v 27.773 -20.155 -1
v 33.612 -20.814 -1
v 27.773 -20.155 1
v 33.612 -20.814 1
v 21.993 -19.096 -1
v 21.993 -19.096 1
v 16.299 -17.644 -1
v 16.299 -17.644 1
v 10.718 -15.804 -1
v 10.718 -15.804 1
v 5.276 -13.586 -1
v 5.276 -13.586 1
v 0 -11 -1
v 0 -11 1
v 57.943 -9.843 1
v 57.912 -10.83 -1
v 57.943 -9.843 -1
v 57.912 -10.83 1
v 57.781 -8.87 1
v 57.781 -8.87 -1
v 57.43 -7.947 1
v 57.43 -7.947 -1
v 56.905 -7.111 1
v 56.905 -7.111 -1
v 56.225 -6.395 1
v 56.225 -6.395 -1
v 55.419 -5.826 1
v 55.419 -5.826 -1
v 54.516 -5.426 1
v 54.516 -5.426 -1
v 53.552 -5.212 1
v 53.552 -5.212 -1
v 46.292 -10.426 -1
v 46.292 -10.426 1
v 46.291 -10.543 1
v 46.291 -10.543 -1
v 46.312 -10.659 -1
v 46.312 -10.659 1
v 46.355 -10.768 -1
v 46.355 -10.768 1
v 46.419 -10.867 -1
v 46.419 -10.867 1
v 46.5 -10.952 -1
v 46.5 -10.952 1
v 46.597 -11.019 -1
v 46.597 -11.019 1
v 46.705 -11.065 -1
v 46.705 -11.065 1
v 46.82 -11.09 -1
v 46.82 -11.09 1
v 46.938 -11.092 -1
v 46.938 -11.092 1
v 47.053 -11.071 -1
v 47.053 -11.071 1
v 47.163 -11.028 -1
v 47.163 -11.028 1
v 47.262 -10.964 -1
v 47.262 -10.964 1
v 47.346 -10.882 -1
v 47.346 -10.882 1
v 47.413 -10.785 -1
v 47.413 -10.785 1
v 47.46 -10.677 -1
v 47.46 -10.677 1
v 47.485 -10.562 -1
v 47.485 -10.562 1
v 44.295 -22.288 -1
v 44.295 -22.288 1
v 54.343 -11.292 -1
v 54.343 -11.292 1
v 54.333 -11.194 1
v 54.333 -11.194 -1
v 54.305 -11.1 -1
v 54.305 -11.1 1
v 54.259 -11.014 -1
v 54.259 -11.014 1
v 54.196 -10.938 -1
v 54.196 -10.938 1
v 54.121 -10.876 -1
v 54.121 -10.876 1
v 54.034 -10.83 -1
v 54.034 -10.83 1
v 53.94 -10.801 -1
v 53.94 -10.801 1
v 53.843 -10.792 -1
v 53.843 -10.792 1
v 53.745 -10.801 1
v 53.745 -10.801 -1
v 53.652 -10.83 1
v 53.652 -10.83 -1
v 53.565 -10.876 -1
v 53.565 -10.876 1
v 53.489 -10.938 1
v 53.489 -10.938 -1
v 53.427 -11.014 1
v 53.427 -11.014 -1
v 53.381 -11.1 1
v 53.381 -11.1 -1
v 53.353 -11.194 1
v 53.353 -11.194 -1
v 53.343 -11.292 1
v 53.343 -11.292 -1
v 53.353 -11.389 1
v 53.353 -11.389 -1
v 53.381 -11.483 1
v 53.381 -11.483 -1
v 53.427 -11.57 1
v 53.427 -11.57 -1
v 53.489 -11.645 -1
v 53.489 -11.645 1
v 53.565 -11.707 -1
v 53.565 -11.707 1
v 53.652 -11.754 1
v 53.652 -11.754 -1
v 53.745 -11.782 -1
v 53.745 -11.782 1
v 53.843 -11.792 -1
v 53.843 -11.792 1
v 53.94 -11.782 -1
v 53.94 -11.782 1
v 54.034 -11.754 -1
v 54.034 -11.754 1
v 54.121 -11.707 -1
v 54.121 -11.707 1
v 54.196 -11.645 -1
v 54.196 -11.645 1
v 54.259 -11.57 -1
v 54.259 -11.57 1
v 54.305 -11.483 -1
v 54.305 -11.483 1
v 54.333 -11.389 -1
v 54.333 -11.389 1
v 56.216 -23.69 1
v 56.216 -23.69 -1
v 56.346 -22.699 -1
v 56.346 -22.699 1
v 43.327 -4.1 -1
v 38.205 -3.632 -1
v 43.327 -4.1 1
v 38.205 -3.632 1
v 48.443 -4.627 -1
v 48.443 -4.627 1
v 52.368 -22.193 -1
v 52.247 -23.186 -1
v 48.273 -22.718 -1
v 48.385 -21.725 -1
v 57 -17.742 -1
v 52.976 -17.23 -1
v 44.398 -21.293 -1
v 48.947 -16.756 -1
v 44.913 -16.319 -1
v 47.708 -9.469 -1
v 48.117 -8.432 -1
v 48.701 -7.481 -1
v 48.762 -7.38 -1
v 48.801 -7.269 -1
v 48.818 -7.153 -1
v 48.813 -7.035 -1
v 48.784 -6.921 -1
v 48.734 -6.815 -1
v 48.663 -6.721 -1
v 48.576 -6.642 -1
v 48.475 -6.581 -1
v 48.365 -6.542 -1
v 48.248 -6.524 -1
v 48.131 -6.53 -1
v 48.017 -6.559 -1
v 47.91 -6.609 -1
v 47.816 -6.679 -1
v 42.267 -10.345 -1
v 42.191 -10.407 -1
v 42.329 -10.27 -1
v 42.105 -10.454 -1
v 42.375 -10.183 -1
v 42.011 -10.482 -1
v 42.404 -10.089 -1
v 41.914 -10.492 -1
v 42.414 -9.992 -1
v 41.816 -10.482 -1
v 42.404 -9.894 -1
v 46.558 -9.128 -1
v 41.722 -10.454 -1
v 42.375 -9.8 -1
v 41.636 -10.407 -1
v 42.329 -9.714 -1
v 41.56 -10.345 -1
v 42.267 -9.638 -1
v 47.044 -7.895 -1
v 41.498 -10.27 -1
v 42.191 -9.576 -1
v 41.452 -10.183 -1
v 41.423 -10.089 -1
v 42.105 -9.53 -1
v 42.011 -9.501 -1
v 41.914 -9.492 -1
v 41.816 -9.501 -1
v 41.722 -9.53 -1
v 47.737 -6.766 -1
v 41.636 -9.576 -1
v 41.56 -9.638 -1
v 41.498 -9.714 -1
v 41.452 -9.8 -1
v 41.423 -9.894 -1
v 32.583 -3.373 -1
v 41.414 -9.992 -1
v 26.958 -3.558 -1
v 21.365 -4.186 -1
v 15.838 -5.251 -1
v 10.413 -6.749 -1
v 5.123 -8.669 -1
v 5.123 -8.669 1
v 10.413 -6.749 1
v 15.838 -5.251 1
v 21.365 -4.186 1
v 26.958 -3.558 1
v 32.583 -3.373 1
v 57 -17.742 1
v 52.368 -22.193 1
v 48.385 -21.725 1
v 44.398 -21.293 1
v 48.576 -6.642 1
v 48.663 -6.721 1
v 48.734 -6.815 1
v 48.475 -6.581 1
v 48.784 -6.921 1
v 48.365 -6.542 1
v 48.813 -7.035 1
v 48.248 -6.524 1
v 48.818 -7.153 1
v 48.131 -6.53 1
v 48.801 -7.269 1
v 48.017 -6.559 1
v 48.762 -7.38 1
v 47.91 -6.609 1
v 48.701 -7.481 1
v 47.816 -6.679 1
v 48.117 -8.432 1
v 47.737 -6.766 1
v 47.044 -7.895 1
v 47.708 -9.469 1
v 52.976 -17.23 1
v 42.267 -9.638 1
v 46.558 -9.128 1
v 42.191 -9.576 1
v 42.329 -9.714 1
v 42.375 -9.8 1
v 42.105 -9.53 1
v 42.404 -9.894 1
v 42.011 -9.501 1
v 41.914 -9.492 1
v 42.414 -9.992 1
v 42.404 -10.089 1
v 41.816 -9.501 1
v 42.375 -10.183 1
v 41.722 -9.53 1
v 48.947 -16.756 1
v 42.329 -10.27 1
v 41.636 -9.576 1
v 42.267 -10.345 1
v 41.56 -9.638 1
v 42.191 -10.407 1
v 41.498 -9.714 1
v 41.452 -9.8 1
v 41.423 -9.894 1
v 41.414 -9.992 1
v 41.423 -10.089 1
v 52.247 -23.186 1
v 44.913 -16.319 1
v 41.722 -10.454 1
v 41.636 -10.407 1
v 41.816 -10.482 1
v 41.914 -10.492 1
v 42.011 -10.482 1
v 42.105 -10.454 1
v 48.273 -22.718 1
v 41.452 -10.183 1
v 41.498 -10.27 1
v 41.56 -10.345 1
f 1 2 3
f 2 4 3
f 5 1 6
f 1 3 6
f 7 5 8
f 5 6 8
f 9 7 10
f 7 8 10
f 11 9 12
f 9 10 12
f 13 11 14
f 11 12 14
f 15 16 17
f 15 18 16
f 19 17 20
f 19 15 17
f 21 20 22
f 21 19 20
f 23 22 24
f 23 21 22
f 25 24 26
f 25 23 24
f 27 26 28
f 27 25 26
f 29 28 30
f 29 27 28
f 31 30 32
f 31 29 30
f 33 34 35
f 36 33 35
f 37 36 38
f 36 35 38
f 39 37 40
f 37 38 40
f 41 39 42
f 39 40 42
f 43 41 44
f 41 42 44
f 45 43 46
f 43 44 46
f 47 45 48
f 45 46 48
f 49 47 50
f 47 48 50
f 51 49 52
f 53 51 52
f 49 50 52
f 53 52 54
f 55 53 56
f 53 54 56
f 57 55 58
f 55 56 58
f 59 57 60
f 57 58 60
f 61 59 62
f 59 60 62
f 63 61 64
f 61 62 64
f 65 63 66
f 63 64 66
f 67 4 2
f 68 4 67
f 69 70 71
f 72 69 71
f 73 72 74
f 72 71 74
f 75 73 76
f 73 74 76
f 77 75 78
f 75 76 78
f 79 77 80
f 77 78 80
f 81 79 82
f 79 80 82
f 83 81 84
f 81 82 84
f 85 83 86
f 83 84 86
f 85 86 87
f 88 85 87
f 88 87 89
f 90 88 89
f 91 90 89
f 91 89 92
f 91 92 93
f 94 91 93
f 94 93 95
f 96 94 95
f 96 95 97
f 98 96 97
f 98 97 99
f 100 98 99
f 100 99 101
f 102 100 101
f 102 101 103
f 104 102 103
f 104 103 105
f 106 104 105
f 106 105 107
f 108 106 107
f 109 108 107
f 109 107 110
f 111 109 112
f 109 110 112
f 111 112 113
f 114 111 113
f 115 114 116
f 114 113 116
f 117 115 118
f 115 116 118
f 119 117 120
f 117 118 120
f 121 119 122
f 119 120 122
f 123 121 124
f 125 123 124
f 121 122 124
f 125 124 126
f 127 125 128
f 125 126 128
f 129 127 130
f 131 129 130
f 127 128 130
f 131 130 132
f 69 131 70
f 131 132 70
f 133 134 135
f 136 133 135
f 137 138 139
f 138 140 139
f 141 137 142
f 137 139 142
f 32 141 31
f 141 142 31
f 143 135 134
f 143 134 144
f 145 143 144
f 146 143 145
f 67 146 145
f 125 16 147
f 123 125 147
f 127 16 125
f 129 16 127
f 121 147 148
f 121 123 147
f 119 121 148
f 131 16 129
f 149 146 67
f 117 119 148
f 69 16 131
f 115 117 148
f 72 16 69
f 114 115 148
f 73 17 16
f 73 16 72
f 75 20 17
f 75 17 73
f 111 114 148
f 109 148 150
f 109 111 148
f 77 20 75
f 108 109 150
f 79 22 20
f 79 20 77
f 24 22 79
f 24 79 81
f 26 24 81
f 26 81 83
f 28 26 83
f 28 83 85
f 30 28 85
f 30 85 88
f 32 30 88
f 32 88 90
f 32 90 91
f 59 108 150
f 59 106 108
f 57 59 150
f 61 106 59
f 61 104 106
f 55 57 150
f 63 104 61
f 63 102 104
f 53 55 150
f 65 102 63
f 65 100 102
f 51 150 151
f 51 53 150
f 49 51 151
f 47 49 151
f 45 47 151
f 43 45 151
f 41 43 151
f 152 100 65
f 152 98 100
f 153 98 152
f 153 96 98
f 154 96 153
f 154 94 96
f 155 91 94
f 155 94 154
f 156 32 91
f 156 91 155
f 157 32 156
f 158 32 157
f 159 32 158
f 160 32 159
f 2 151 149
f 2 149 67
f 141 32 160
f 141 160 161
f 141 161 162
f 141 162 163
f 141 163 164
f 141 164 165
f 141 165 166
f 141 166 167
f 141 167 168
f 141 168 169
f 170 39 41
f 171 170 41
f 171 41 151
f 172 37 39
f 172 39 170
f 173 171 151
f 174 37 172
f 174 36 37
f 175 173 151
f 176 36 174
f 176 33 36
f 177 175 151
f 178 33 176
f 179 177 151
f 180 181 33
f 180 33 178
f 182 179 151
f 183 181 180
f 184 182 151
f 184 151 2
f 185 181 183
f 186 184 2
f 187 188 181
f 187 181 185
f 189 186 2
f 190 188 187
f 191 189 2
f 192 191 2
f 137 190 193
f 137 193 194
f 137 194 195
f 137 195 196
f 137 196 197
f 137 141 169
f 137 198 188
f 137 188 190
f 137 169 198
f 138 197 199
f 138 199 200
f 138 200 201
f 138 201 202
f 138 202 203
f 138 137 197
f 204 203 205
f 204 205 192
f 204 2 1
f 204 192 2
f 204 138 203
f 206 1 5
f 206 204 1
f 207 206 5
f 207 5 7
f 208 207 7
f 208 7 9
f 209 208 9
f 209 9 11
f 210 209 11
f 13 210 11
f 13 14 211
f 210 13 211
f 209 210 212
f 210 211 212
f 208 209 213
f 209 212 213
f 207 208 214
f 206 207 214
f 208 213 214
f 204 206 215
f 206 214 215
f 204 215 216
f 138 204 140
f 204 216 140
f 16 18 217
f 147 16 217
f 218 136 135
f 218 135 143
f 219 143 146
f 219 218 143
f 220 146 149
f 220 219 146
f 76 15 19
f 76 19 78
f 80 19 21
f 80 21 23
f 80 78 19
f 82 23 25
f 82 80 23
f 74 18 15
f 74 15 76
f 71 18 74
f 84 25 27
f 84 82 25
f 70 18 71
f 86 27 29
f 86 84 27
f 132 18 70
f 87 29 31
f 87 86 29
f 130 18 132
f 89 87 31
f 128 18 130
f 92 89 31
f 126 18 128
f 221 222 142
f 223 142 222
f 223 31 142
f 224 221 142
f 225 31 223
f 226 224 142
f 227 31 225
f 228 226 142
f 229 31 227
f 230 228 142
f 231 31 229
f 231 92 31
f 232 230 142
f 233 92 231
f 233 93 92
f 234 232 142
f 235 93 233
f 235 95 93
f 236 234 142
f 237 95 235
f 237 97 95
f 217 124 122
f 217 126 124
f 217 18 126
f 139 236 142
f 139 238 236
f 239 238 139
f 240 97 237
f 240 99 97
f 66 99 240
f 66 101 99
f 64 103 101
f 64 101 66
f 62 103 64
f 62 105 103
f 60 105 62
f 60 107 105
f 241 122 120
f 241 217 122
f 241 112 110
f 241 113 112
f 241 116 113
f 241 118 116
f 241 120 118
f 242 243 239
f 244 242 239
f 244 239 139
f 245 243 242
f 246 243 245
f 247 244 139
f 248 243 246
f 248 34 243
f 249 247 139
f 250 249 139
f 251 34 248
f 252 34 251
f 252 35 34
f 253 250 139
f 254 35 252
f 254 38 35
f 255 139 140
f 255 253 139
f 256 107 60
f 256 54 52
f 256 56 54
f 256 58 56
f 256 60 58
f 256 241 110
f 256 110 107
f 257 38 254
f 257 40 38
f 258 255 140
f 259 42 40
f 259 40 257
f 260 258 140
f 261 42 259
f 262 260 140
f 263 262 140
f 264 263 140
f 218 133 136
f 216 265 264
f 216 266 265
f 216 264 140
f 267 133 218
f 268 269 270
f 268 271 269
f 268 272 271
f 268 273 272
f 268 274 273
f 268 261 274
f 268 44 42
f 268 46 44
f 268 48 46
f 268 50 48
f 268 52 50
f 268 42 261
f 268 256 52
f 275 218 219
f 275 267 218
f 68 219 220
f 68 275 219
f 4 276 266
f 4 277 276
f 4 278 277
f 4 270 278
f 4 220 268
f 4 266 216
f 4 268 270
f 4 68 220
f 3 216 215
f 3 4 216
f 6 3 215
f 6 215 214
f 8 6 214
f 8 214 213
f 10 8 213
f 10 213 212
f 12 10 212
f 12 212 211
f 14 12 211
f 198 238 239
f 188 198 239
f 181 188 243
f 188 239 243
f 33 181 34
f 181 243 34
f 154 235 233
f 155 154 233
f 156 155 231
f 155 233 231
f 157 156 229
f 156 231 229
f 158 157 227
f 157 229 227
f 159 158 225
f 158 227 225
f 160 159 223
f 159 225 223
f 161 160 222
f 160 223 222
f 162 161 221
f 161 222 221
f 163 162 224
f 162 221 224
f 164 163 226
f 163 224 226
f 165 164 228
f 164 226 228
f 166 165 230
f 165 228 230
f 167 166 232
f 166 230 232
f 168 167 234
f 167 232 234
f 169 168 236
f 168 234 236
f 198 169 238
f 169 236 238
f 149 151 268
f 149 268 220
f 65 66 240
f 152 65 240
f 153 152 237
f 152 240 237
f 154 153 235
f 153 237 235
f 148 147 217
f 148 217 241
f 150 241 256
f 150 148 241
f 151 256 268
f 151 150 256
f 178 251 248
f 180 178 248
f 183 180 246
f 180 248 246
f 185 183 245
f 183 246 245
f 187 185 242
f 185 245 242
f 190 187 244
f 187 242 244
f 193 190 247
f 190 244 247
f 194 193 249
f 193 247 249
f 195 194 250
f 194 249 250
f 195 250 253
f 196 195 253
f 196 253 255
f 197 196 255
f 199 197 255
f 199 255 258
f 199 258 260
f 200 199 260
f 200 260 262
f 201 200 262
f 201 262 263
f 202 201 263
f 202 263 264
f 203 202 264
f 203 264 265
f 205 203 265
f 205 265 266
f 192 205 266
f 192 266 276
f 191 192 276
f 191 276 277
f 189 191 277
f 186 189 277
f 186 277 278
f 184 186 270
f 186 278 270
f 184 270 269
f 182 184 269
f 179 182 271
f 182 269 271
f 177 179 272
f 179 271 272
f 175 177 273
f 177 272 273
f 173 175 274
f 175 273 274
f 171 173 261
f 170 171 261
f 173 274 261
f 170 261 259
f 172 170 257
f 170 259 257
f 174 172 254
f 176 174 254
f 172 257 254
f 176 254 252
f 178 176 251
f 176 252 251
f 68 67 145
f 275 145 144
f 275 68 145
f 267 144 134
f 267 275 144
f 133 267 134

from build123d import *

# Parameters (mm, degrees)
P_IDAT_VYSUNUT_M1_DEPTH             = 1
SKICA3_R                            = 0.5
ODEBRAT_VYSUNUT_M1_DEPTH            = 64.02628038
ODEBRAT_VYSUNUT_M2_DEPTH            = 64.02628038
ODEBRAT_VYSUNUT_M2_DEPTH_BACK       = 64.02628038
P_IDAT_VYSUNUT_M2_REACH             = 64.499
P_IDAT_VYSUNUT_M2_DIRECTION_2_REACH = 64.499
ZAOBLIT1_R                          = 5


with BuildPart() as part:
    # Skica2 → Přidat vysunutím1 (new, symmetric)
    with BuildSketch(Plane.XY):
        with BuildLine():
            Line((58.568883798, -5.84497543), (56.281036775, -23.194781077))
            ThreePointArc((56.281036775, -23.194781077), (44.962038089, -21.854387935), (33.611521044, -20.814124588))
            ThreePointArc((33.611521044, -20.814124588), (16.298701423, -17.643643834), (0, -11))
            ThreePointArc((0, -11), (18.591127375, -4.663998517), (38.205152177, -3.63202809))
            ThreePointArc((38.205152177, -3.63202809), (48.399667289, -4.622101799), (58.568883798, -5.84497543))
        make_face()
    extrude(amount=P_IDAT_VYSUNUT_M1_DEPTH, both=True)

    # Skica3 → Odebrat vysunutím1 (cut, through all)
    with BuildSketch(Plane.XY.offset(1)):
        with Locations((41.913528916, -9.991754516)):
            Circle(SKICA3_R)
        with Locations((53.842906505, -11.291735411)):
            Circle(SKICA3_R)
        with BuildLine():
            ThreePointArc((47.737008304, -6.766472197), (46.773837436, -8.500989544), (46.292411943, -10.42569161))
            ThreePointArc((46.292411943, -10.42569161), (46.82013174, -11.090155165), (47.484595295, -10.562435368))
            ThreePointArc((47.484595295, -10.562435368), (47.890006236, -8.941633628), (48.701097493, -7.480987442))
            ThreePointArc((48.701097493, -7.480987442), (48.576310521, -6.641685225), (47.737008304, -6.766472197))
        make_face()
    extrude(amount=-ODEBRAT_VYSUNUT_M1_DEPTH, mode=Mode.SUBTRACT)

    # Skica4 → Odebrat vysunutím2 (cut, two sides: drawn at the far end of the back side and taken through both)
    with BuildSketch(Plane.XY.offset(1).offset(-ODEBRAT_VYSUNUT_M2_DEPTH_BACK)):
        with BuildLine():
            Line((44.91326279, -16.319473776), (44.346696401, -21.790214359))
            ThreePointArc((44.346696401, -21.790214359), (50.318767602, -22.450854723), (56.281036775, -23.194781077))
            Line((56.281036775, -23.194781077), (57.000074411, -17.741985017))
            ThreePointArc((57.000074411, -17.741985017), (50.961632228, -16.988554377), (44.91326279, -16.319473776))
        make_face()
    extrude(amount=ODEBRAT_VYSUNUT_M2_DEPTH + ODEBRAT_VYSUNUT_M2_DEPTH_BACK, mode=Mode.SUBTRACT)

    # Přidat vysunutím2: up to this face of the body (flat: up to its plane)
    p_idat_vysunut_m2_end = Plane(part.part.faces().sort_by_distance((32.156276153, -11.702089795, 1))[0])
    # Skica5 → Přidat vysunutím2 (add, up to the picked face)
    with BuildSketch(Plane.XY, mode=Mode.PRIVATE) as p_idat_vysunut_m2_sk1:
        with BuildLine():
            Line((33.611521044, -20.814124588), (44.295190366, -22.287554412))
            ThreePointArc((44.295190366, -22.287554412), (50.260325363, -22.947427482), (56.215669717, -23.69048981))
            Line((56.215669717, -23.69048981), (56.346403833, -22.699072345))
            ThreePointArc((56.346403833, -22.699072345), (50.37720984, -21.954281964), (44.398202436, -21.292874306))
            Line((44.398202436, -21.292874306), (44.346696401, -21.790214359))
            ThreePointArc((44.346696401, -21.790214359), (38.982163929, -21.268567871), (33.611521044, -20.814124588))
        make_face()
    p_idat_vysunut_m2_tool1 = split(extrude(p_idat_vysunut_m2_sk1.sketch, amount=P_IDAT_VYSUNUT_M2_REACH, mode=Mode.PRIVATE), bisect_by=p_idat_vysunut_m2_end, keep=Keep.BOTH, mode=Mode.PRIVATE)
    add(p_idat_vysunut_m2_tool1.solids().sort_by(Axis((48.409605, -22.295213, 0), (0, 0, 1)))[0])

    # Přidat vysunutím2 direction 2: up to this face of the body (flat: up to its plane)
    p_idat_vysunut_m2_direction_2_end = Plane(part.part.faces().sort_by_distance((32.156276153, -11.702089795, -1))[0])
    # Skica5 → Přidat vysunutím2 direction 2 (add, up to the picked face)
    with BuildSketch(Plane.XY, mode=Mode.PRIVATE) as p_idat_vysunut_m2_direction_2_sk1:
        with BuildLine():
            Line((33.611521044, -20.814124588), (44.295190366, -22.287554412))
            ThreePointArc((44.295190366, -22.287554412), (50.260325363, -22.947427482), (56.215669717, -23.69048981))
            Line((56.215669717, -23.69048981), (56.346403833, -22.699072345))
            ThreePointArc((56.346403833, -22.699072345), (50.37720984, -21.954281964), (44.398202436, -21.292874306))
            Line((44.398202436, -21.292874306), (44.346696401, -21.790214359))
            ThreePointArc((44.346696401, -21.790214359), (38.982163929, -21.268567871), (33.611521044, -20.814124588))
        make_face()
    p_idat_vysunut_m2_direction_2_tool1 = split(extrude(p_idat_vysunut_m2_direction_2_sk1.sketch, amount=-P_IDAT_VYSUNUT_M2_DIRECTION_2_REACH, mode=Mode.PRIVATE), bisect_by=p_idat_vysunut_m2_direction_2_end, keep=Keep.BOTH, mode=Mode.PRIVATE)
    add(p_idat_vysunut_m2_direction_2_tool1.solids().sort_by(Axis((48.409605, -22.295213, 0), (0, 0, -1)))[0])

    # Zaoblit1
    zaoblit1_edges = [part.edges().sort_by_distance(p)[0] for p in [
        (58.568883798, -5.84497543, 0),
    ]]
    fillet(zaoblit1_edges, radius=ZAOBLIT1_R)


solid = part.part
